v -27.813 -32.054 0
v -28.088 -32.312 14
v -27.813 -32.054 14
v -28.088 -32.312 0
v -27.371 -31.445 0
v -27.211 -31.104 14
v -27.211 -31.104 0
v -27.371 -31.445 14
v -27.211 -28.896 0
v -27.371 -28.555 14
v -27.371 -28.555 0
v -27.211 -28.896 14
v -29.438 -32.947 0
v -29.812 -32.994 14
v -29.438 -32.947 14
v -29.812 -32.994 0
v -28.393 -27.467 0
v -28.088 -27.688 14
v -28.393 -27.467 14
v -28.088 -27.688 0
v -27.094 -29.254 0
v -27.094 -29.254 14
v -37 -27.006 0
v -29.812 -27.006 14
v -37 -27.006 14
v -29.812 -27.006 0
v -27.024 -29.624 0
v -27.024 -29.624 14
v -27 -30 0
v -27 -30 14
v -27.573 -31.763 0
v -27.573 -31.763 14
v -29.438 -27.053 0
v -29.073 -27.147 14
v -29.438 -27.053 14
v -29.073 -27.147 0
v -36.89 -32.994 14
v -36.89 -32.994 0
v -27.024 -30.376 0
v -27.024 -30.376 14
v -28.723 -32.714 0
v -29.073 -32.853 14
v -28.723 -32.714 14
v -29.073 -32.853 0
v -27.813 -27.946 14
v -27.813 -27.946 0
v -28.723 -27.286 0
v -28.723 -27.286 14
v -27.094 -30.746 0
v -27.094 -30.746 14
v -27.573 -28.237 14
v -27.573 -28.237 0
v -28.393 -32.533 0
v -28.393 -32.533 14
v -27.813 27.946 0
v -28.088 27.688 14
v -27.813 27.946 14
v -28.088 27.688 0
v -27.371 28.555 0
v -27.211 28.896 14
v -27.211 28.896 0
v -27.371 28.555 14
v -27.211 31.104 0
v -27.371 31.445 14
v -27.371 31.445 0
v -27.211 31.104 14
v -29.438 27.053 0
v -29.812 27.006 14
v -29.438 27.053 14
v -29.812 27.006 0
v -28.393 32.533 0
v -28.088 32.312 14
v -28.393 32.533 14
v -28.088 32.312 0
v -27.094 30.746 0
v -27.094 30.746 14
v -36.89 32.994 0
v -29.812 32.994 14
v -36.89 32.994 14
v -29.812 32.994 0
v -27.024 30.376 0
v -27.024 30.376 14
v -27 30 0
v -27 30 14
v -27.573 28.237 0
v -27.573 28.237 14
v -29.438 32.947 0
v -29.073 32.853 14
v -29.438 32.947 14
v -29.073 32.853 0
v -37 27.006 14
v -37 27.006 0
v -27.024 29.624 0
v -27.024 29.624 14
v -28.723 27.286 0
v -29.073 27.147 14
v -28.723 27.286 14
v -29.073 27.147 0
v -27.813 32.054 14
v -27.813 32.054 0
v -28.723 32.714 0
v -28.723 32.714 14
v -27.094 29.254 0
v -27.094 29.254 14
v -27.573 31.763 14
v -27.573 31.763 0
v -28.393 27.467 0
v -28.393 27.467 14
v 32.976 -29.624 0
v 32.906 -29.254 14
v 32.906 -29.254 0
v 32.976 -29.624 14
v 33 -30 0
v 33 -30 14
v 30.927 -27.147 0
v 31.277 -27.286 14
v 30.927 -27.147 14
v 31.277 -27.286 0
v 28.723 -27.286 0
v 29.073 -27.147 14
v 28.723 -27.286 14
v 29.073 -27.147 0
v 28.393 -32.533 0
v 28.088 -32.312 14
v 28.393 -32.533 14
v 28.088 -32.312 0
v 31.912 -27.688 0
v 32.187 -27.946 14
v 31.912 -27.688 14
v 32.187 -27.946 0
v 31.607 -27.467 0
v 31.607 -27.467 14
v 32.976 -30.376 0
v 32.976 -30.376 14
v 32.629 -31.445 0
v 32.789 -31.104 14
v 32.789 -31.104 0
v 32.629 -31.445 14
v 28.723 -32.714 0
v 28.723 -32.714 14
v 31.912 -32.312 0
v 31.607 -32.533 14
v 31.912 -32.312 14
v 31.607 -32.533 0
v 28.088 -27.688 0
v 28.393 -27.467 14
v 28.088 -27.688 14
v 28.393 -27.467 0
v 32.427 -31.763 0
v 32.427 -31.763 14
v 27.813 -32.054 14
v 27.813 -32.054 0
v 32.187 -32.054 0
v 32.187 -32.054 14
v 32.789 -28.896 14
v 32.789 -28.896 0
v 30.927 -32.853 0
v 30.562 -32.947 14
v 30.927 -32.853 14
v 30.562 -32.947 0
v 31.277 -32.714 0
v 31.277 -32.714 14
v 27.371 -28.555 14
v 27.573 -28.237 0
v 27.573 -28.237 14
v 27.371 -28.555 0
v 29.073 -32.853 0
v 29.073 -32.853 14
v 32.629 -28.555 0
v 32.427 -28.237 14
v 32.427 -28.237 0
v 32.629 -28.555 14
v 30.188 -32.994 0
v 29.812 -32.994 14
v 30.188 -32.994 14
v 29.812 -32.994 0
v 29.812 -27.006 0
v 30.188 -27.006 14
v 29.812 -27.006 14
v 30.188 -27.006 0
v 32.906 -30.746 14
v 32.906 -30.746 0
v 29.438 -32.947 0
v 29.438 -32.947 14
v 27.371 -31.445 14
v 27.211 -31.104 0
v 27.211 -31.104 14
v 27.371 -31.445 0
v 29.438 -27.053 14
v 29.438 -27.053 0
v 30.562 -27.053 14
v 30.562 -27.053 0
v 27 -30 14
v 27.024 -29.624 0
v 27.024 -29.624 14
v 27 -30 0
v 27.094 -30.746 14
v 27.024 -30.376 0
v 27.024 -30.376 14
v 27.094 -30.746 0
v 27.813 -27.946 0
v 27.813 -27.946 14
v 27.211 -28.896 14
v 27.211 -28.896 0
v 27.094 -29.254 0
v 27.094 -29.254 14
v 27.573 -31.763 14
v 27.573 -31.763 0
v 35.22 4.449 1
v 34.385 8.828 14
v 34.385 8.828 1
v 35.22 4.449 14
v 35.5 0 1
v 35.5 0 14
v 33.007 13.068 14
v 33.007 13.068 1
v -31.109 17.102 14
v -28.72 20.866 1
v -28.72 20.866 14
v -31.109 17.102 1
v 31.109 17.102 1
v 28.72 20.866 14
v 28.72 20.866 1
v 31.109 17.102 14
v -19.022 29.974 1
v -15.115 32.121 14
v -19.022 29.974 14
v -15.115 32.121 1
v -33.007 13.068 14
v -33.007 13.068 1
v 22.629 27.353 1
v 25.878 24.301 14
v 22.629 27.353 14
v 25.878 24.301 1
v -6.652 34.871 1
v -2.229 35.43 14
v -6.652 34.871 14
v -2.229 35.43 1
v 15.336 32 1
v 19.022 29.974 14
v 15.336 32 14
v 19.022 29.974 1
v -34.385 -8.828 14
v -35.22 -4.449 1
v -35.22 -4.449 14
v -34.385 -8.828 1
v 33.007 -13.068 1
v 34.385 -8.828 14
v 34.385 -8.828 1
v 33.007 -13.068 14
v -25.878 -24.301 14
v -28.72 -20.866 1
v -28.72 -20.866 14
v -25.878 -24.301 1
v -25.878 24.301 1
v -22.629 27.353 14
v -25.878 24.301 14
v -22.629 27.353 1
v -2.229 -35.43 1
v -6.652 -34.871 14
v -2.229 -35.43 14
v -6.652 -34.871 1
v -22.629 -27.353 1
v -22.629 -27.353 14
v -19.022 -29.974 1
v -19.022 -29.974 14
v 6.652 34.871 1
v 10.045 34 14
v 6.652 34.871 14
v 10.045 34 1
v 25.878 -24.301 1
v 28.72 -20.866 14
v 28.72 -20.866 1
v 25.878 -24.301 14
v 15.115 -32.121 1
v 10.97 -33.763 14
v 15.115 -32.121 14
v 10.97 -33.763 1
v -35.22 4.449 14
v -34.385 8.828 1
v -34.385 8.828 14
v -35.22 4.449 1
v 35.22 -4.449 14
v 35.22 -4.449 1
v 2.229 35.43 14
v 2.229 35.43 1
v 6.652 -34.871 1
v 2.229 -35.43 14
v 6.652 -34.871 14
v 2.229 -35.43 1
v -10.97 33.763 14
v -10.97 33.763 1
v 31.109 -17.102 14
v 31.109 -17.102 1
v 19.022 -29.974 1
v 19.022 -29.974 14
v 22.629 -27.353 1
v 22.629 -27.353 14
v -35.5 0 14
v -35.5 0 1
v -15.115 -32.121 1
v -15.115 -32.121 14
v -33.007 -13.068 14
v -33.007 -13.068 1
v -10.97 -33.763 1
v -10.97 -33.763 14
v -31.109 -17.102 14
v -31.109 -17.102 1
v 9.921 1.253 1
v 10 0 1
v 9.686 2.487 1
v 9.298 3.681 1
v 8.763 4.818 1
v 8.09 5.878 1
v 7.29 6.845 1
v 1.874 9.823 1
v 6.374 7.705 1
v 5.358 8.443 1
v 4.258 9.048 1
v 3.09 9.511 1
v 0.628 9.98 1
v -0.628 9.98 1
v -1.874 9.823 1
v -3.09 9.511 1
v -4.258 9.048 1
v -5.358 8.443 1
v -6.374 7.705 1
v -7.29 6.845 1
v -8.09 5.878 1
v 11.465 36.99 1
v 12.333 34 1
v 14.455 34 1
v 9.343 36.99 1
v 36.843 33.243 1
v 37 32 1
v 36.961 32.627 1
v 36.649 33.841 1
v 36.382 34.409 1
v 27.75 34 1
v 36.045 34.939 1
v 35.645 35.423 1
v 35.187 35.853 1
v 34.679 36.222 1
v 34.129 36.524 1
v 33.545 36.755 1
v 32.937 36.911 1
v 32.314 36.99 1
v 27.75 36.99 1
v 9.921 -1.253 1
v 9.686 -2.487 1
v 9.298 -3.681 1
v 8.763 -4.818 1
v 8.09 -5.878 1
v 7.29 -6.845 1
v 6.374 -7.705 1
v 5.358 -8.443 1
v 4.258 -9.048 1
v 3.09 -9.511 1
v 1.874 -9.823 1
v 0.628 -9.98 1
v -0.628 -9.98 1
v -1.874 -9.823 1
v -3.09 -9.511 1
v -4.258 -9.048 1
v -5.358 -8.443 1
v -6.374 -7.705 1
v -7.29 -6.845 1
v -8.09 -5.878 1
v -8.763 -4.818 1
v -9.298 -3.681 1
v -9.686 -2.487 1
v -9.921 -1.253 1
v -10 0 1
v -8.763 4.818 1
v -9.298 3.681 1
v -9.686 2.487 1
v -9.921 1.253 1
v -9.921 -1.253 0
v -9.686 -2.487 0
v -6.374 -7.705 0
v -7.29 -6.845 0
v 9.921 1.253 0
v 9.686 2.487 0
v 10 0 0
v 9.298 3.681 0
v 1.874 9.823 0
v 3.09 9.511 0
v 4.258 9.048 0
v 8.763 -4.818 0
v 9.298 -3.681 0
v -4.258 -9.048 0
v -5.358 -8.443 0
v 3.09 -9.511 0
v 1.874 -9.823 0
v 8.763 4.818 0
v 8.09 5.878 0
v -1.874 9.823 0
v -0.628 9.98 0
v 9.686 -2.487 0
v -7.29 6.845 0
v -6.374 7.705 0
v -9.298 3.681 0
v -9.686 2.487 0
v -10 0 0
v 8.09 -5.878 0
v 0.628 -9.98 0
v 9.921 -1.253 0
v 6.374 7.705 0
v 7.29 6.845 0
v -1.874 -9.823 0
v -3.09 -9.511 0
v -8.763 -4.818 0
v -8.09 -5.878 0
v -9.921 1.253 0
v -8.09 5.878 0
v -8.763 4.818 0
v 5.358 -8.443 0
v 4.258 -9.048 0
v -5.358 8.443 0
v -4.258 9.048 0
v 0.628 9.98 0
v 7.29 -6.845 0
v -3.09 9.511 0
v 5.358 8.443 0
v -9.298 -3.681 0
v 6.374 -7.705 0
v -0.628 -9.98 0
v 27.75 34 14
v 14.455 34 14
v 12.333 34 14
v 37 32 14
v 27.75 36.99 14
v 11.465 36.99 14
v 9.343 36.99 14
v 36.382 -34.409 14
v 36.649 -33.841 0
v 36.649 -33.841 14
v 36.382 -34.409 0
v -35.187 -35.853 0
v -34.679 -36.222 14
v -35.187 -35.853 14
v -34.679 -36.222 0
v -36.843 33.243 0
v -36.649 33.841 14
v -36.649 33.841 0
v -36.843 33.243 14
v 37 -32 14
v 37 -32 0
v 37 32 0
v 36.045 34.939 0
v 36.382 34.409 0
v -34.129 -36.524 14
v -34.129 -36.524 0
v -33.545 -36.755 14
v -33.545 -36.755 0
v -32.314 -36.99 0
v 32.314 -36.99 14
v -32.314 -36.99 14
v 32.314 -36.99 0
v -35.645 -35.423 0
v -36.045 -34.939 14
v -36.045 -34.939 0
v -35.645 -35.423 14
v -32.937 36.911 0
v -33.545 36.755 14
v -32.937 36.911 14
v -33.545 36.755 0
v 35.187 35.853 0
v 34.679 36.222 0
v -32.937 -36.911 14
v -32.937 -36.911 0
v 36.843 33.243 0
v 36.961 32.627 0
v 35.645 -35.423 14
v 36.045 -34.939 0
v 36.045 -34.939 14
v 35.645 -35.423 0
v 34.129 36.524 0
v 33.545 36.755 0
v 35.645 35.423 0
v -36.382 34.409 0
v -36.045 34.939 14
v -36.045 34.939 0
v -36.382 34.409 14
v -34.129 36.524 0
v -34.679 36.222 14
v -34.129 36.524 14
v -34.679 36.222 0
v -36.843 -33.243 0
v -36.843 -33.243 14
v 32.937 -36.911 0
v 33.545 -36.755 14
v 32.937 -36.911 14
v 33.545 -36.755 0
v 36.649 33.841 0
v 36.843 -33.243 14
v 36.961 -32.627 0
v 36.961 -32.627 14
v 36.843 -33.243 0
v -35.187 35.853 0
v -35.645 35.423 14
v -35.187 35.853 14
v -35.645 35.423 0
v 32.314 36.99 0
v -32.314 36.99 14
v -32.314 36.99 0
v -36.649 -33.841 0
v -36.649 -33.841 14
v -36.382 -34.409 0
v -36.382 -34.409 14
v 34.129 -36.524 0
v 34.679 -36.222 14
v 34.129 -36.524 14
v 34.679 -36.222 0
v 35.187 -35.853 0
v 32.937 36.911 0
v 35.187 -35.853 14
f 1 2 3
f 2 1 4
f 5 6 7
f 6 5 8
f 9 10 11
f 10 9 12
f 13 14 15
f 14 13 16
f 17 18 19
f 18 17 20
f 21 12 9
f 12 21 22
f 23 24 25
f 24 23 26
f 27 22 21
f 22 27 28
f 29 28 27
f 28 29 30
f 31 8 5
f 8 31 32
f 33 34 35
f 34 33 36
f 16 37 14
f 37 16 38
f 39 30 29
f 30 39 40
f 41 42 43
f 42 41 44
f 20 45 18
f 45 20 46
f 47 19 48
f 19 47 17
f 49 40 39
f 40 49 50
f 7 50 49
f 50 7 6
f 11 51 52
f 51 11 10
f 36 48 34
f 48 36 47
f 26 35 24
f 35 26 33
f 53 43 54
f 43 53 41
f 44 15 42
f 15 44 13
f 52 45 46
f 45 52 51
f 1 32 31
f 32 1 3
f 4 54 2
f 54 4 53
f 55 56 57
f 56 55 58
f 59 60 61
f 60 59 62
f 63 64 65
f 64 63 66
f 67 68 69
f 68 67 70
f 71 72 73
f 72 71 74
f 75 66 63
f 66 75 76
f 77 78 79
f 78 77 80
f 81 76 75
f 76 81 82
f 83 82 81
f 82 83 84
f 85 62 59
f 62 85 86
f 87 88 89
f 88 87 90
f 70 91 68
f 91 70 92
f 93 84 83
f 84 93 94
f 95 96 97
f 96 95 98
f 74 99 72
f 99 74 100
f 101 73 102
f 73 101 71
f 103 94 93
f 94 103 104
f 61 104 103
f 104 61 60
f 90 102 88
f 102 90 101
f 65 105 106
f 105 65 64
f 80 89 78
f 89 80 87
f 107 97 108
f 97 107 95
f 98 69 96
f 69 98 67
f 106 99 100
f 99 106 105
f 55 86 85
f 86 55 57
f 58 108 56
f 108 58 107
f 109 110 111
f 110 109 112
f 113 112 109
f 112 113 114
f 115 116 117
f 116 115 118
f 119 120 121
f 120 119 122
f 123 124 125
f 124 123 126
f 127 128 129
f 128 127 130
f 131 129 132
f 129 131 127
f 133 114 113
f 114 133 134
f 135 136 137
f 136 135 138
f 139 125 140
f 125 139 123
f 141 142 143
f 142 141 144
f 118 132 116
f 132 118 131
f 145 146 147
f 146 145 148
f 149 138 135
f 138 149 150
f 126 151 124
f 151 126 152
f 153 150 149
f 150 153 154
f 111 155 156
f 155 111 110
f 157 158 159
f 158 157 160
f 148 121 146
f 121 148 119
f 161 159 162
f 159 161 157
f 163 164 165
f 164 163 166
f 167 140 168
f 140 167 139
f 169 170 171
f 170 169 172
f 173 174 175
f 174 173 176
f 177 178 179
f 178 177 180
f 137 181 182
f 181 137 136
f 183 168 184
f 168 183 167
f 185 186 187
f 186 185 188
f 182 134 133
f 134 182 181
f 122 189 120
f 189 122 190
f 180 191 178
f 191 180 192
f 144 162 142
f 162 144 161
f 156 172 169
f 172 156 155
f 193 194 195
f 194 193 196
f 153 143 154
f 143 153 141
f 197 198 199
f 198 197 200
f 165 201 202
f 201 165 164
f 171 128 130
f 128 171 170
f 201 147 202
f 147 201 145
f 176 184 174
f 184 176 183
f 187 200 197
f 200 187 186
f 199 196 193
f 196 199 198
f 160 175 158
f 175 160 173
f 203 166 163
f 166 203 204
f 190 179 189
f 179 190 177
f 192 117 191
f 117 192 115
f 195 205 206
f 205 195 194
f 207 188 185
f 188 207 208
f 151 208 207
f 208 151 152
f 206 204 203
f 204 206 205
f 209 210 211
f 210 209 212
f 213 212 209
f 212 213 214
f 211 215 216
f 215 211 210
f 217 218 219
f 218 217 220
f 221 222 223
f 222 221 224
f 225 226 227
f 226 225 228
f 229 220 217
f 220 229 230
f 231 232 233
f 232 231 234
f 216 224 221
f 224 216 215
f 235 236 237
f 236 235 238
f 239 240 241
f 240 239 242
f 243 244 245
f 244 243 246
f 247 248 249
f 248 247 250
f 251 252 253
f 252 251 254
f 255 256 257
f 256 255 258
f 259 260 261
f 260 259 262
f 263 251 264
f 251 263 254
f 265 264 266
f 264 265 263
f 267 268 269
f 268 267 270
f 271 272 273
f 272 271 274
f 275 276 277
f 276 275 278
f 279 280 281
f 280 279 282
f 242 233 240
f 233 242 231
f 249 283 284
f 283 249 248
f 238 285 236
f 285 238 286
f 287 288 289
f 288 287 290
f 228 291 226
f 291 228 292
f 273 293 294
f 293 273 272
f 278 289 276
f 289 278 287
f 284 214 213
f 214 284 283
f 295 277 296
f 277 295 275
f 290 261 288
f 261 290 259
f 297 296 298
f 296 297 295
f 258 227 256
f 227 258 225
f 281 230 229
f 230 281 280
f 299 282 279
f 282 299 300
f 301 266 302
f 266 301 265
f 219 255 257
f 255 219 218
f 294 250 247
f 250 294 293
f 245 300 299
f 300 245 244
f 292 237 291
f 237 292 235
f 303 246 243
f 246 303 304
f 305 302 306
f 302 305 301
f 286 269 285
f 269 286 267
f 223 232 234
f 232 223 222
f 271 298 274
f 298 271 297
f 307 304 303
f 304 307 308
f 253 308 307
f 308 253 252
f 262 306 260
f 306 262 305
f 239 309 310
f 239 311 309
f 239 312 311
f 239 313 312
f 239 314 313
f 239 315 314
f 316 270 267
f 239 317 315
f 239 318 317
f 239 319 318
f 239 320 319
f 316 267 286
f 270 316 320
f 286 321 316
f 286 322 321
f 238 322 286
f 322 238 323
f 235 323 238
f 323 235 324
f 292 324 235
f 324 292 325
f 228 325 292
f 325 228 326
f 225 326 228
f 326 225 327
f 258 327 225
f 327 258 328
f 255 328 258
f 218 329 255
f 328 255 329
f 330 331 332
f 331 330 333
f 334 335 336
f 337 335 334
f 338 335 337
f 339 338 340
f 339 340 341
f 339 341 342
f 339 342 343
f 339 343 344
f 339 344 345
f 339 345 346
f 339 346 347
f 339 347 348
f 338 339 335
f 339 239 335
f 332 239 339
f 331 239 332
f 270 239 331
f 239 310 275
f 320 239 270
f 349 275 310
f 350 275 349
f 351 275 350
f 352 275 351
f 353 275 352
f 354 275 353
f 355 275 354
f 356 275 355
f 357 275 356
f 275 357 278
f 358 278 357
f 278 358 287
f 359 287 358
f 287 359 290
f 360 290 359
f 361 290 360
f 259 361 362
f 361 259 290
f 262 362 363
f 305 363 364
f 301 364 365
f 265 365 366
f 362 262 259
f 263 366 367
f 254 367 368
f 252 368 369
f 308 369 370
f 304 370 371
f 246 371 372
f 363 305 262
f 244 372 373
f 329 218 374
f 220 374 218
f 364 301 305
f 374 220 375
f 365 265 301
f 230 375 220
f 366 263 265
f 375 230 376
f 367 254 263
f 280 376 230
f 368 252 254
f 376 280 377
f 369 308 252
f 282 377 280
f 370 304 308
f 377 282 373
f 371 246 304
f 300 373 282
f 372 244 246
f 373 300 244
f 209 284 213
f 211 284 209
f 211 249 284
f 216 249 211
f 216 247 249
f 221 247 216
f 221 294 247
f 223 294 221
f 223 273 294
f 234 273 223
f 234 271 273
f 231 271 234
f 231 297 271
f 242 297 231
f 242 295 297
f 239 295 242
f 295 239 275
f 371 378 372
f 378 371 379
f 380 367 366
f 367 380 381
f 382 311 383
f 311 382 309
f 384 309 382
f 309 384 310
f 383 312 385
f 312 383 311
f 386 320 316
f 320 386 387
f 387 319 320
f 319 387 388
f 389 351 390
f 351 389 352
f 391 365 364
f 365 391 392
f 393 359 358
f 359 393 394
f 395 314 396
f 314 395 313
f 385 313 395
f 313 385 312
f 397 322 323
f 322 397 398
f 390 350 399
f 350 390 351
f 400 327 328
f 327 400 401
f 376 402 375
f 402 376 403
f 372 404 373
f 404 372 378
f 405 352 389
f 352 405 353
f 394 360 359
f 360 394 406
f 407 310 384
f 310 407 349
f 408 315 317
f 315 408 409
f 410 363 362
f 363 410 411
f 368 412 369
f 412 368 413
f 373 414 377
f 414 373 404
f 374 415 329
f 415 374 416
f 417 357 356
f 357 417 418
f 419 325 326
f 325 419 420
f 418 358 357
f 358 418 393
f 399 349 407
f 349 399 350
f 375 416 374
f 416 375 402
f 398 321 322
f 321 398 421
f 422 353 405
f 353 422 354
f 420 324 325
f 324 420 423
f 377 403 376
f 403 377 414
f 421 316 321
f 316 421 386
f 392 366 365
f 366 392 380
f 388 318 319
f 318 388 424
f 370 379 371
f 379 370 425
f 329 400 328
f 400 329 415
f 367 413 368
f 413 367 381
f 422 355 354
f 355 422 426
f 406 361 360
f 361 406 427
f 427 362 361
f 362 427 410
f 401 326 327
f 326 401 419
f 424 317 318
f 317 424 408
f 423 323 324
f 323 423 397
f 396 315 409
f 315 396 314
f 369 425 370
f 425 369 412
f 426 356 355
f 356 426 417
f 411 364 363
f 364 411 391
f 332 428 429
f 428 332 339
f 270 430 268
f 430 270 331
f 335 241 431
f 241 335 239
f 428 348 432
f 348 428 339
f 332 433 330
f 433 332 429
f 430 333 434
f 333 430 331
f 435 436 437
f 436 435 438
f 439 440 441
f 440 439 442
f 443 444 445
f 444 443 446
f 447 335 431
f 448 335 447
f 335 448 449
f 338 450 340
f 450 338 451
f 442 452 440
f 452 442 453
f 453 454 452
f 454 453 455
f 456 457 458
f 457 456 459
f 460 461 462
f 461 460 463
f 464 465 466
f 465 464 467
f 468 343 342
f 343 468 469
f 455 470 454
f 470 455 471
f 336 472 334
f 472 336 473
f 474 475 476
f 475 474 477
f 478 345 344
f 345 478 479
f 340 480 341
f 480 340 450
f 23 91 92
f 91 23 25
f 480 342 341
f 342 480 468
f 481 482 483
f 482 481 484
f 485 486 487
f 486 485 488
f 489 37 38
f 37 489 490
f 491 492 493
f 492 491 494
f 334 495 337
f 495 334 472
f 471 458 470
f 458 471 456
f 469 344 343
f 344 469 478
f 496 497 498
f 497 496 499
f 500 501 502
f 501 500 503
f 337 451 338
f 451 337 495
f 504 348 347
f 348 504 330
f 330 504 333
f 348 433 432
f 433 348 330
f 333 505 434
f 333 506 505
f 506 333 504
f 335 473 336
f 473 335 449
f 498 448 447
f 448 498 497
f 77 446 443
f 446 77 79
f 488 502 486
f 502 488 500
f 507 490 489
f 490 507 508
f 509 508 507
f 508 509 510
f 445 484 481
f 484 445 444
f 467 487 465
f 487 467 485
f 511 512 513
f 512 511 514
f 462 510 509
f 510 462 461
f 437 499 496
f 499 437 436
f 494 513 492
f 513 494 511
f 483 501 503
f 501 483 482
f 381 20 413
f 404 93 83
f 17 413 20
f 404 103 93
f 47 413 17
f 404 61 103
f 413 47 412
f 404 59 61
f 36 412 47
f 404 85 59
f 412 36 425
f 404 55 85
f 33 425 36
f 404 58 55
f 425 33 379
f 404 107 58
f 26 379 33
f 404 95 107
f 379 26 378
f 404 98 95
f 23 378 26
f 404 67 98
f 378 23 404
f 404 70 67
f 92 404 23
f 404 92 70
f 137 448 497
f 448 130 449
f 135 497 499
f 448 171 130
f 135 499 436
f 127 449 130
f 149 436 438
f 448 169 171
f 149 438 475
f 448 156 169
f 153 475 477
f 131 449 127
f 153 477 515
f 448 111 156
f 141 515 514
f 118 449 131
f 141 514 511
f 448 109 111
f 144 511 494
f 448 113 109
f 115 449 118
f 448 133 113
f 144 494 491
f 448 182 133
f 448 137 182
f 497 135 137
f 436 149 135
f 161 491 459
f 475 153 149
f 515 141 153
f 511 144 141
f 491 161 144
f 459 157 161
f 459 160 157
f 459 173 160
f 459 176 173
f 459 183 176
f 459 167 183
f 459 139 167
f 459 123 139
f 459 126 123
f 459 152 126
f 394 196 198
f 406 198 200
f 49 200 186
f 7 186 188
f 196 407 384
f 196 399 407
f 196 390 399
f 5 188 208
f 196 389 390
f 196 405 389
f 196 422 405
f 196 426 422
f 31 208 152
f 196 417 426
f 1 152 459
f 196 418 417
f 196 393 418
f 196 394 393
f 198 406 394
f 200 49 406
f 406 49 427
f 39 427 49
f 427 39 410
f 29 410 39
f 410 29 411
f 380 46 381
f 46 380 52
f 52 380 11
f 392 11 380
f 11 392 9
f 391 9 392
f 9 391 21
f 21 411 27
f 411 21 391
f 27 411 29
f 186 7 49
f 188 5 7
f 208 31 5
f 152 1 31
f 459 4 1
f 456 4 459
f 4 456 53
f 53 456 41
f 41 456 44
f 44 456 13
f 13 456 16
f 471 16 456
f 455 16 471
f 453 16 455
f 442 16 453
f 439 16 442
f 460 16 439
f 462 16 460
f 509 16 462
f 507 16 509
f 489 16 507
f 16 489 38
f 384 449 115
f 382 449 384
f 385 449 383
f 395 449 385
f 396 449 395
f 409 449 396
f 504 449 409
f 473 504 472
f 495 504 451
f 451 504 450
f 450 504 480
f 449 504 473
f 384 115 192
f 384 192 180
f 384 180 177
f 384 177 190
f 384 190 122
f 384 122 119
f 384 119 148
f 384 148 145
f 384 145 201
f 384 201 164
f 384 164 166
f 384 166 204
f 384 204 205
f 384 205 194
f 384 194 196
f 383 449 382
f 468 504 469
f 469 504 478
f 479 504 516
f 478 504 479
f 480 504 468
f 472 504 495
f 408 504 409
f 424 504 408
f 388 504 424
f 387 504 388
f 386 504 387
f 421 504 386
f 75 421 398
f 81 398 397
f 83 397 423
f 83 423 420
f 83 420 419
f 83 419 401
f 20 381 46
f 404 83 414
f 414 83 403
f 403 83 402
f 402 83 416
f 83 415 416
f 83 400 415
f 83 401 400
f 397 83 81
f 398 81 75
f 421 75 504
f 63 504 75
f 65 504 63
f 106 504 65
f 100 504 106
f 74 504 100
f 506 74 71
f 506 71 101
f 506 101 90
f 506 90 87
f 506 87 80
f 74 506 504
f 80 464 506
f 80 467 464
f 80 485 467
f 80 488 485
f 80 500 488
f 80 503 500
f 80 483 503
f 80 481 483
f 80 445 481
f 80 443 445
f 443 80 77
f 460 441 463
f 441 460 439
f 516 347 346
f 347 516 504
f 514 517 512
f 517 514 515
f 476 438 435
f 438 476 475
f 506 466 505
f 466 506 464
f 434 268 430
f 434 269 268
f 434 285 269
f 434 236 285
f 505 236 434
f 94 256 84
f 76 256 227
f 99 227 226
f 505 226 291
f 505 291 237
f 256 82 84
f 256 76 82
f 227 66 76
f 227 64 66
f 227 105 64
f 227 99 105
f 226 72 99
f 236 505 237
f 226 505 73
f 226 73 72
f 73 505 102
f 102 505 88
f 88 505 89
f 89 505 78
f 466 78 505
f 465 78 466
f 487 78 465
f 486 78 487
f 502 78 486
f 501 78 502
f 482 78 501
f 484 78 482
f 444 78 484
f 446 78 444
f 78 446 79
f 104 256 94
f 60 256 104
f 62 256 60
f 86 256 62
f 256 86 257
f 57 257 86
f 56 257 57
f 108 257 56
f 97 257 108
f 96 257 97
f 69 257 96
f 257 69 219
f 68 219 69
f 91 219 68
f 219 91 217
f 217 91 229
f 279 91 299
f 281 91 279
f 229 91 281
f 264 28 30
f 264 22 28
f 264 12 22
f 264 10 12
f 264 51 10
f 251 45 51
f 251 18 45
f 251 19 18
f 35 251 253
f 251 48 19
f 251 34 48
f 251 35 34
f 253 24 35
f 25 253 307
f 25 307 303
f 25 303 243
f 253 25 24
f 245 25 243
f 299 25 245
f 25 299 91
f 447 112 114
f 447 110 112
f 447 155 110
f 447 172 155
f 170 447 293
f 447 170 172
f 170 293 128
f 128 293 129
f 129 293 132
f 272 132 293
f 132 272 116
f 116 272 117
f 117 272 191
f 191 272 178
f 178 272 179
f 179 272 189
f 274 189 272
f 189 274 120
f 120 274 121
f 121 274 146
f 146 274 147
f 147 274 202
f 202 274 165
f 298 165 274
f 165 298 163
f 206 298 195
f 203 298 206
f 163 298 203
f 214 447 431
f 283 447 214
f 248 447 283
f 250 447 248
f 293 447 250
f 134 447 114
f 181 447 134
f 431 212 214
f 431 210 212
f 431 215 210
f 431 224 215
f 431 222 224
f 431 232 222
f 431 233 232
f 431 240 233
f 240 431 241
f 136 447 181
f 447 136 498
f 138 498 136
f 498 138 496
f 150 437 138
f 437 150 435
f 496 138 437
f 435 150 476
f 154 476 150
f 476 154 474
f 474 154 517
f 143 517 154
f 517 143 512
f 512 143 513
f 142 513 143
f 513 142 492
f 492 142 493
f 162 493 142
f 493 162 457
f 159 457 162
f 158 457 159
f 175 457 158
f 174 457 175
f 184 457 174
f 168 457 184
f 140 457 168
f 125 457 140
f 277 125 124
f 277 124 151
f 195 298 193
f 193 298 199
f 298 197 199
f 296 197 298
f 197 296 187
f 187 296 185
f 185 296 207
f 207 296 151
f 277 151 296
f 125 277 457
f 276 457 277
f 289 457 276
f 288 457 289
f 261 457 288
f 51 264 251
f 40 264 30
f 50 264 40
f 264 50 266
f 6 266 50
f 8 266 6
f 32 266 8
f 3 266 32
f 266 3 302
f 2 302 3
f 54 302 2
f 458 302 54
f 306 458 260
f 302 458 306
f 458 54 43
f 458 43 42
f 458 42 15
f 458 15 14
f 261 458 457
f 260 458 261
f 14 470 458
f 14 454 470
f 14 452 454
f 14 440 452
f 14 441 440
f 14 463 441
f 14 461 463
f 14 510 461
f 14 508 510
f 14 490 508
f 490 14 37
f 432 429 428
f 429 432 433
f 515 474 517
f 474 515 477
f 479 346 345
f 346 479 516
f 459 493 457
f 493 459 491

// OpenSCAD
$fn = 50;


difference() {
	union() {
		translate(v = [0, 0, 0]) {
			rotate(a = [0, 0, 0]) {
				hull() {
					translate(v = [-32.0000000000, 32.0000000000, 0]) {
						rotate(a = [0, 0, 0]) {
							translate(v = [0, 0, 0]) {
								rotate(a = [0, 0, 0]) {
									cylinder(h = 14, r = 5);
								}
							}
						}
					}
					translate(v = [32.0000000000, 32.0000000000, 0]) {
						rotate(a = [0, 0, 0]) {
							translate(v = [0, 0, 0]) {
								rotate(a = [0, 0, 0]) {
									cylinder(h = 14, r = 5);
								}
							}
						}
					}
					translate(v = [-32.0000000000, -32.0000000000, 0]) {
						rotate(a = [0, 0, 0]) {
							translate(v = [0, 0, 0]) {
								rotate(a = [0, 0, 0]) {
									cylinder(h = 14, r = 5);
								}
							}
						}
					}
					translate(v = [32.0000000000, -32.0000000000, 0]) {
						rotate(a = [0, 0, 0]) {
							translate(v = [0, 0, 0]) {
								rotate(a = [0, 0, 0]) {
									cylinder(h = 14, r = 5);
								}
							}
						}
					}
				}
			}
		}
	}
	union() {
		translate(v = [-37.5000000000, -30.0000000000, -125]) {
			rotate(a = [0, 0, 0]) {
				hull() {
					translate(v = [7.5000000000, 0, 0]) {
						rotate(a = [0, 0, 0]) {
							translate(v = [0, 0, 0]) {
								rotate(a = [0, 0, 0]) {
									cylinder(h = 250, r = 3.0000000000);
								}
							}
						}
					}
					translate(v = [-7.5000000000, 0, 0]) {
						rotate(a = [0, 0, 0]) {
							translate(v = [0, 0, 0]) {
								rotate(a = [0, 0, 0]) {
									cylinder(h = 250, r = 3.0000000000);
								}
							}
						}
					}
				}
			}
		}
		translate(v = [-37.5000000000, 30.0000000000, -125]) {
			rotate(a = [0, 0, 0]) {
				hull() {
					translate(v = [7.5000000000, 0, 0]) {
						rotate(a = [0, 0, 0]) {
							translate(v = [0, 0, 0]) {
								rotate(a = [0, 0, 0]) {
									cylinder(h = 250, r = 3.0000000000);
								}
							}
						}
					}
					translate(v = [-7.5000000000, 0, 0]) {
						rotate(a = [0, 0, 0]) {
							translate(v = [0, 0, 0]) {
								rotate(a = [0, 0, 0]) {
									cylinder(h = 250, r = 3.0000000000);
								}
							}
						}
					}
				}
			}
		}
		translate(v = [30.0000000000, -30.0000000000, -125.0000000000]) {
			rotate(a = [0, 0, 0]) {
				cylinder(h = 250, r = 3.0000000000);
			}
		}
		translate(v = [0, 0, 1.0000000000]) {
			rotate(a = [0, 0, 0]) {
				cylinder(h = 16, r = 35.5000000000);
			}
		}
		translate(v = [0, 0, -7.0000000000]) {
			rotate(a = [0, 0, 0]) {
				cylinder(h = 14, r = 10.0000000000);
			}
		}
		translate(v = [0.0000000000, 32.0000000000, 1]) {
			rotate(a = [0, 0, 0]) {
				cube(size = [37.0000000000, 2, 16]);
			}
		}
		translate(v = [27.7500000000, 32.0000000000, 1]) {
			rotate(a = [0, 0, 0]) {
				cube(size = [9.2500000000, 5, 16]);
			}
		}
		translate(v = [8.5833333333, 37.7500000000, 1]) {
			rotate(a = [0, 0, -45]) {
				cube(size = [7.5000000000, 1.5000000000, 16]);
			}
		}
	}
}
